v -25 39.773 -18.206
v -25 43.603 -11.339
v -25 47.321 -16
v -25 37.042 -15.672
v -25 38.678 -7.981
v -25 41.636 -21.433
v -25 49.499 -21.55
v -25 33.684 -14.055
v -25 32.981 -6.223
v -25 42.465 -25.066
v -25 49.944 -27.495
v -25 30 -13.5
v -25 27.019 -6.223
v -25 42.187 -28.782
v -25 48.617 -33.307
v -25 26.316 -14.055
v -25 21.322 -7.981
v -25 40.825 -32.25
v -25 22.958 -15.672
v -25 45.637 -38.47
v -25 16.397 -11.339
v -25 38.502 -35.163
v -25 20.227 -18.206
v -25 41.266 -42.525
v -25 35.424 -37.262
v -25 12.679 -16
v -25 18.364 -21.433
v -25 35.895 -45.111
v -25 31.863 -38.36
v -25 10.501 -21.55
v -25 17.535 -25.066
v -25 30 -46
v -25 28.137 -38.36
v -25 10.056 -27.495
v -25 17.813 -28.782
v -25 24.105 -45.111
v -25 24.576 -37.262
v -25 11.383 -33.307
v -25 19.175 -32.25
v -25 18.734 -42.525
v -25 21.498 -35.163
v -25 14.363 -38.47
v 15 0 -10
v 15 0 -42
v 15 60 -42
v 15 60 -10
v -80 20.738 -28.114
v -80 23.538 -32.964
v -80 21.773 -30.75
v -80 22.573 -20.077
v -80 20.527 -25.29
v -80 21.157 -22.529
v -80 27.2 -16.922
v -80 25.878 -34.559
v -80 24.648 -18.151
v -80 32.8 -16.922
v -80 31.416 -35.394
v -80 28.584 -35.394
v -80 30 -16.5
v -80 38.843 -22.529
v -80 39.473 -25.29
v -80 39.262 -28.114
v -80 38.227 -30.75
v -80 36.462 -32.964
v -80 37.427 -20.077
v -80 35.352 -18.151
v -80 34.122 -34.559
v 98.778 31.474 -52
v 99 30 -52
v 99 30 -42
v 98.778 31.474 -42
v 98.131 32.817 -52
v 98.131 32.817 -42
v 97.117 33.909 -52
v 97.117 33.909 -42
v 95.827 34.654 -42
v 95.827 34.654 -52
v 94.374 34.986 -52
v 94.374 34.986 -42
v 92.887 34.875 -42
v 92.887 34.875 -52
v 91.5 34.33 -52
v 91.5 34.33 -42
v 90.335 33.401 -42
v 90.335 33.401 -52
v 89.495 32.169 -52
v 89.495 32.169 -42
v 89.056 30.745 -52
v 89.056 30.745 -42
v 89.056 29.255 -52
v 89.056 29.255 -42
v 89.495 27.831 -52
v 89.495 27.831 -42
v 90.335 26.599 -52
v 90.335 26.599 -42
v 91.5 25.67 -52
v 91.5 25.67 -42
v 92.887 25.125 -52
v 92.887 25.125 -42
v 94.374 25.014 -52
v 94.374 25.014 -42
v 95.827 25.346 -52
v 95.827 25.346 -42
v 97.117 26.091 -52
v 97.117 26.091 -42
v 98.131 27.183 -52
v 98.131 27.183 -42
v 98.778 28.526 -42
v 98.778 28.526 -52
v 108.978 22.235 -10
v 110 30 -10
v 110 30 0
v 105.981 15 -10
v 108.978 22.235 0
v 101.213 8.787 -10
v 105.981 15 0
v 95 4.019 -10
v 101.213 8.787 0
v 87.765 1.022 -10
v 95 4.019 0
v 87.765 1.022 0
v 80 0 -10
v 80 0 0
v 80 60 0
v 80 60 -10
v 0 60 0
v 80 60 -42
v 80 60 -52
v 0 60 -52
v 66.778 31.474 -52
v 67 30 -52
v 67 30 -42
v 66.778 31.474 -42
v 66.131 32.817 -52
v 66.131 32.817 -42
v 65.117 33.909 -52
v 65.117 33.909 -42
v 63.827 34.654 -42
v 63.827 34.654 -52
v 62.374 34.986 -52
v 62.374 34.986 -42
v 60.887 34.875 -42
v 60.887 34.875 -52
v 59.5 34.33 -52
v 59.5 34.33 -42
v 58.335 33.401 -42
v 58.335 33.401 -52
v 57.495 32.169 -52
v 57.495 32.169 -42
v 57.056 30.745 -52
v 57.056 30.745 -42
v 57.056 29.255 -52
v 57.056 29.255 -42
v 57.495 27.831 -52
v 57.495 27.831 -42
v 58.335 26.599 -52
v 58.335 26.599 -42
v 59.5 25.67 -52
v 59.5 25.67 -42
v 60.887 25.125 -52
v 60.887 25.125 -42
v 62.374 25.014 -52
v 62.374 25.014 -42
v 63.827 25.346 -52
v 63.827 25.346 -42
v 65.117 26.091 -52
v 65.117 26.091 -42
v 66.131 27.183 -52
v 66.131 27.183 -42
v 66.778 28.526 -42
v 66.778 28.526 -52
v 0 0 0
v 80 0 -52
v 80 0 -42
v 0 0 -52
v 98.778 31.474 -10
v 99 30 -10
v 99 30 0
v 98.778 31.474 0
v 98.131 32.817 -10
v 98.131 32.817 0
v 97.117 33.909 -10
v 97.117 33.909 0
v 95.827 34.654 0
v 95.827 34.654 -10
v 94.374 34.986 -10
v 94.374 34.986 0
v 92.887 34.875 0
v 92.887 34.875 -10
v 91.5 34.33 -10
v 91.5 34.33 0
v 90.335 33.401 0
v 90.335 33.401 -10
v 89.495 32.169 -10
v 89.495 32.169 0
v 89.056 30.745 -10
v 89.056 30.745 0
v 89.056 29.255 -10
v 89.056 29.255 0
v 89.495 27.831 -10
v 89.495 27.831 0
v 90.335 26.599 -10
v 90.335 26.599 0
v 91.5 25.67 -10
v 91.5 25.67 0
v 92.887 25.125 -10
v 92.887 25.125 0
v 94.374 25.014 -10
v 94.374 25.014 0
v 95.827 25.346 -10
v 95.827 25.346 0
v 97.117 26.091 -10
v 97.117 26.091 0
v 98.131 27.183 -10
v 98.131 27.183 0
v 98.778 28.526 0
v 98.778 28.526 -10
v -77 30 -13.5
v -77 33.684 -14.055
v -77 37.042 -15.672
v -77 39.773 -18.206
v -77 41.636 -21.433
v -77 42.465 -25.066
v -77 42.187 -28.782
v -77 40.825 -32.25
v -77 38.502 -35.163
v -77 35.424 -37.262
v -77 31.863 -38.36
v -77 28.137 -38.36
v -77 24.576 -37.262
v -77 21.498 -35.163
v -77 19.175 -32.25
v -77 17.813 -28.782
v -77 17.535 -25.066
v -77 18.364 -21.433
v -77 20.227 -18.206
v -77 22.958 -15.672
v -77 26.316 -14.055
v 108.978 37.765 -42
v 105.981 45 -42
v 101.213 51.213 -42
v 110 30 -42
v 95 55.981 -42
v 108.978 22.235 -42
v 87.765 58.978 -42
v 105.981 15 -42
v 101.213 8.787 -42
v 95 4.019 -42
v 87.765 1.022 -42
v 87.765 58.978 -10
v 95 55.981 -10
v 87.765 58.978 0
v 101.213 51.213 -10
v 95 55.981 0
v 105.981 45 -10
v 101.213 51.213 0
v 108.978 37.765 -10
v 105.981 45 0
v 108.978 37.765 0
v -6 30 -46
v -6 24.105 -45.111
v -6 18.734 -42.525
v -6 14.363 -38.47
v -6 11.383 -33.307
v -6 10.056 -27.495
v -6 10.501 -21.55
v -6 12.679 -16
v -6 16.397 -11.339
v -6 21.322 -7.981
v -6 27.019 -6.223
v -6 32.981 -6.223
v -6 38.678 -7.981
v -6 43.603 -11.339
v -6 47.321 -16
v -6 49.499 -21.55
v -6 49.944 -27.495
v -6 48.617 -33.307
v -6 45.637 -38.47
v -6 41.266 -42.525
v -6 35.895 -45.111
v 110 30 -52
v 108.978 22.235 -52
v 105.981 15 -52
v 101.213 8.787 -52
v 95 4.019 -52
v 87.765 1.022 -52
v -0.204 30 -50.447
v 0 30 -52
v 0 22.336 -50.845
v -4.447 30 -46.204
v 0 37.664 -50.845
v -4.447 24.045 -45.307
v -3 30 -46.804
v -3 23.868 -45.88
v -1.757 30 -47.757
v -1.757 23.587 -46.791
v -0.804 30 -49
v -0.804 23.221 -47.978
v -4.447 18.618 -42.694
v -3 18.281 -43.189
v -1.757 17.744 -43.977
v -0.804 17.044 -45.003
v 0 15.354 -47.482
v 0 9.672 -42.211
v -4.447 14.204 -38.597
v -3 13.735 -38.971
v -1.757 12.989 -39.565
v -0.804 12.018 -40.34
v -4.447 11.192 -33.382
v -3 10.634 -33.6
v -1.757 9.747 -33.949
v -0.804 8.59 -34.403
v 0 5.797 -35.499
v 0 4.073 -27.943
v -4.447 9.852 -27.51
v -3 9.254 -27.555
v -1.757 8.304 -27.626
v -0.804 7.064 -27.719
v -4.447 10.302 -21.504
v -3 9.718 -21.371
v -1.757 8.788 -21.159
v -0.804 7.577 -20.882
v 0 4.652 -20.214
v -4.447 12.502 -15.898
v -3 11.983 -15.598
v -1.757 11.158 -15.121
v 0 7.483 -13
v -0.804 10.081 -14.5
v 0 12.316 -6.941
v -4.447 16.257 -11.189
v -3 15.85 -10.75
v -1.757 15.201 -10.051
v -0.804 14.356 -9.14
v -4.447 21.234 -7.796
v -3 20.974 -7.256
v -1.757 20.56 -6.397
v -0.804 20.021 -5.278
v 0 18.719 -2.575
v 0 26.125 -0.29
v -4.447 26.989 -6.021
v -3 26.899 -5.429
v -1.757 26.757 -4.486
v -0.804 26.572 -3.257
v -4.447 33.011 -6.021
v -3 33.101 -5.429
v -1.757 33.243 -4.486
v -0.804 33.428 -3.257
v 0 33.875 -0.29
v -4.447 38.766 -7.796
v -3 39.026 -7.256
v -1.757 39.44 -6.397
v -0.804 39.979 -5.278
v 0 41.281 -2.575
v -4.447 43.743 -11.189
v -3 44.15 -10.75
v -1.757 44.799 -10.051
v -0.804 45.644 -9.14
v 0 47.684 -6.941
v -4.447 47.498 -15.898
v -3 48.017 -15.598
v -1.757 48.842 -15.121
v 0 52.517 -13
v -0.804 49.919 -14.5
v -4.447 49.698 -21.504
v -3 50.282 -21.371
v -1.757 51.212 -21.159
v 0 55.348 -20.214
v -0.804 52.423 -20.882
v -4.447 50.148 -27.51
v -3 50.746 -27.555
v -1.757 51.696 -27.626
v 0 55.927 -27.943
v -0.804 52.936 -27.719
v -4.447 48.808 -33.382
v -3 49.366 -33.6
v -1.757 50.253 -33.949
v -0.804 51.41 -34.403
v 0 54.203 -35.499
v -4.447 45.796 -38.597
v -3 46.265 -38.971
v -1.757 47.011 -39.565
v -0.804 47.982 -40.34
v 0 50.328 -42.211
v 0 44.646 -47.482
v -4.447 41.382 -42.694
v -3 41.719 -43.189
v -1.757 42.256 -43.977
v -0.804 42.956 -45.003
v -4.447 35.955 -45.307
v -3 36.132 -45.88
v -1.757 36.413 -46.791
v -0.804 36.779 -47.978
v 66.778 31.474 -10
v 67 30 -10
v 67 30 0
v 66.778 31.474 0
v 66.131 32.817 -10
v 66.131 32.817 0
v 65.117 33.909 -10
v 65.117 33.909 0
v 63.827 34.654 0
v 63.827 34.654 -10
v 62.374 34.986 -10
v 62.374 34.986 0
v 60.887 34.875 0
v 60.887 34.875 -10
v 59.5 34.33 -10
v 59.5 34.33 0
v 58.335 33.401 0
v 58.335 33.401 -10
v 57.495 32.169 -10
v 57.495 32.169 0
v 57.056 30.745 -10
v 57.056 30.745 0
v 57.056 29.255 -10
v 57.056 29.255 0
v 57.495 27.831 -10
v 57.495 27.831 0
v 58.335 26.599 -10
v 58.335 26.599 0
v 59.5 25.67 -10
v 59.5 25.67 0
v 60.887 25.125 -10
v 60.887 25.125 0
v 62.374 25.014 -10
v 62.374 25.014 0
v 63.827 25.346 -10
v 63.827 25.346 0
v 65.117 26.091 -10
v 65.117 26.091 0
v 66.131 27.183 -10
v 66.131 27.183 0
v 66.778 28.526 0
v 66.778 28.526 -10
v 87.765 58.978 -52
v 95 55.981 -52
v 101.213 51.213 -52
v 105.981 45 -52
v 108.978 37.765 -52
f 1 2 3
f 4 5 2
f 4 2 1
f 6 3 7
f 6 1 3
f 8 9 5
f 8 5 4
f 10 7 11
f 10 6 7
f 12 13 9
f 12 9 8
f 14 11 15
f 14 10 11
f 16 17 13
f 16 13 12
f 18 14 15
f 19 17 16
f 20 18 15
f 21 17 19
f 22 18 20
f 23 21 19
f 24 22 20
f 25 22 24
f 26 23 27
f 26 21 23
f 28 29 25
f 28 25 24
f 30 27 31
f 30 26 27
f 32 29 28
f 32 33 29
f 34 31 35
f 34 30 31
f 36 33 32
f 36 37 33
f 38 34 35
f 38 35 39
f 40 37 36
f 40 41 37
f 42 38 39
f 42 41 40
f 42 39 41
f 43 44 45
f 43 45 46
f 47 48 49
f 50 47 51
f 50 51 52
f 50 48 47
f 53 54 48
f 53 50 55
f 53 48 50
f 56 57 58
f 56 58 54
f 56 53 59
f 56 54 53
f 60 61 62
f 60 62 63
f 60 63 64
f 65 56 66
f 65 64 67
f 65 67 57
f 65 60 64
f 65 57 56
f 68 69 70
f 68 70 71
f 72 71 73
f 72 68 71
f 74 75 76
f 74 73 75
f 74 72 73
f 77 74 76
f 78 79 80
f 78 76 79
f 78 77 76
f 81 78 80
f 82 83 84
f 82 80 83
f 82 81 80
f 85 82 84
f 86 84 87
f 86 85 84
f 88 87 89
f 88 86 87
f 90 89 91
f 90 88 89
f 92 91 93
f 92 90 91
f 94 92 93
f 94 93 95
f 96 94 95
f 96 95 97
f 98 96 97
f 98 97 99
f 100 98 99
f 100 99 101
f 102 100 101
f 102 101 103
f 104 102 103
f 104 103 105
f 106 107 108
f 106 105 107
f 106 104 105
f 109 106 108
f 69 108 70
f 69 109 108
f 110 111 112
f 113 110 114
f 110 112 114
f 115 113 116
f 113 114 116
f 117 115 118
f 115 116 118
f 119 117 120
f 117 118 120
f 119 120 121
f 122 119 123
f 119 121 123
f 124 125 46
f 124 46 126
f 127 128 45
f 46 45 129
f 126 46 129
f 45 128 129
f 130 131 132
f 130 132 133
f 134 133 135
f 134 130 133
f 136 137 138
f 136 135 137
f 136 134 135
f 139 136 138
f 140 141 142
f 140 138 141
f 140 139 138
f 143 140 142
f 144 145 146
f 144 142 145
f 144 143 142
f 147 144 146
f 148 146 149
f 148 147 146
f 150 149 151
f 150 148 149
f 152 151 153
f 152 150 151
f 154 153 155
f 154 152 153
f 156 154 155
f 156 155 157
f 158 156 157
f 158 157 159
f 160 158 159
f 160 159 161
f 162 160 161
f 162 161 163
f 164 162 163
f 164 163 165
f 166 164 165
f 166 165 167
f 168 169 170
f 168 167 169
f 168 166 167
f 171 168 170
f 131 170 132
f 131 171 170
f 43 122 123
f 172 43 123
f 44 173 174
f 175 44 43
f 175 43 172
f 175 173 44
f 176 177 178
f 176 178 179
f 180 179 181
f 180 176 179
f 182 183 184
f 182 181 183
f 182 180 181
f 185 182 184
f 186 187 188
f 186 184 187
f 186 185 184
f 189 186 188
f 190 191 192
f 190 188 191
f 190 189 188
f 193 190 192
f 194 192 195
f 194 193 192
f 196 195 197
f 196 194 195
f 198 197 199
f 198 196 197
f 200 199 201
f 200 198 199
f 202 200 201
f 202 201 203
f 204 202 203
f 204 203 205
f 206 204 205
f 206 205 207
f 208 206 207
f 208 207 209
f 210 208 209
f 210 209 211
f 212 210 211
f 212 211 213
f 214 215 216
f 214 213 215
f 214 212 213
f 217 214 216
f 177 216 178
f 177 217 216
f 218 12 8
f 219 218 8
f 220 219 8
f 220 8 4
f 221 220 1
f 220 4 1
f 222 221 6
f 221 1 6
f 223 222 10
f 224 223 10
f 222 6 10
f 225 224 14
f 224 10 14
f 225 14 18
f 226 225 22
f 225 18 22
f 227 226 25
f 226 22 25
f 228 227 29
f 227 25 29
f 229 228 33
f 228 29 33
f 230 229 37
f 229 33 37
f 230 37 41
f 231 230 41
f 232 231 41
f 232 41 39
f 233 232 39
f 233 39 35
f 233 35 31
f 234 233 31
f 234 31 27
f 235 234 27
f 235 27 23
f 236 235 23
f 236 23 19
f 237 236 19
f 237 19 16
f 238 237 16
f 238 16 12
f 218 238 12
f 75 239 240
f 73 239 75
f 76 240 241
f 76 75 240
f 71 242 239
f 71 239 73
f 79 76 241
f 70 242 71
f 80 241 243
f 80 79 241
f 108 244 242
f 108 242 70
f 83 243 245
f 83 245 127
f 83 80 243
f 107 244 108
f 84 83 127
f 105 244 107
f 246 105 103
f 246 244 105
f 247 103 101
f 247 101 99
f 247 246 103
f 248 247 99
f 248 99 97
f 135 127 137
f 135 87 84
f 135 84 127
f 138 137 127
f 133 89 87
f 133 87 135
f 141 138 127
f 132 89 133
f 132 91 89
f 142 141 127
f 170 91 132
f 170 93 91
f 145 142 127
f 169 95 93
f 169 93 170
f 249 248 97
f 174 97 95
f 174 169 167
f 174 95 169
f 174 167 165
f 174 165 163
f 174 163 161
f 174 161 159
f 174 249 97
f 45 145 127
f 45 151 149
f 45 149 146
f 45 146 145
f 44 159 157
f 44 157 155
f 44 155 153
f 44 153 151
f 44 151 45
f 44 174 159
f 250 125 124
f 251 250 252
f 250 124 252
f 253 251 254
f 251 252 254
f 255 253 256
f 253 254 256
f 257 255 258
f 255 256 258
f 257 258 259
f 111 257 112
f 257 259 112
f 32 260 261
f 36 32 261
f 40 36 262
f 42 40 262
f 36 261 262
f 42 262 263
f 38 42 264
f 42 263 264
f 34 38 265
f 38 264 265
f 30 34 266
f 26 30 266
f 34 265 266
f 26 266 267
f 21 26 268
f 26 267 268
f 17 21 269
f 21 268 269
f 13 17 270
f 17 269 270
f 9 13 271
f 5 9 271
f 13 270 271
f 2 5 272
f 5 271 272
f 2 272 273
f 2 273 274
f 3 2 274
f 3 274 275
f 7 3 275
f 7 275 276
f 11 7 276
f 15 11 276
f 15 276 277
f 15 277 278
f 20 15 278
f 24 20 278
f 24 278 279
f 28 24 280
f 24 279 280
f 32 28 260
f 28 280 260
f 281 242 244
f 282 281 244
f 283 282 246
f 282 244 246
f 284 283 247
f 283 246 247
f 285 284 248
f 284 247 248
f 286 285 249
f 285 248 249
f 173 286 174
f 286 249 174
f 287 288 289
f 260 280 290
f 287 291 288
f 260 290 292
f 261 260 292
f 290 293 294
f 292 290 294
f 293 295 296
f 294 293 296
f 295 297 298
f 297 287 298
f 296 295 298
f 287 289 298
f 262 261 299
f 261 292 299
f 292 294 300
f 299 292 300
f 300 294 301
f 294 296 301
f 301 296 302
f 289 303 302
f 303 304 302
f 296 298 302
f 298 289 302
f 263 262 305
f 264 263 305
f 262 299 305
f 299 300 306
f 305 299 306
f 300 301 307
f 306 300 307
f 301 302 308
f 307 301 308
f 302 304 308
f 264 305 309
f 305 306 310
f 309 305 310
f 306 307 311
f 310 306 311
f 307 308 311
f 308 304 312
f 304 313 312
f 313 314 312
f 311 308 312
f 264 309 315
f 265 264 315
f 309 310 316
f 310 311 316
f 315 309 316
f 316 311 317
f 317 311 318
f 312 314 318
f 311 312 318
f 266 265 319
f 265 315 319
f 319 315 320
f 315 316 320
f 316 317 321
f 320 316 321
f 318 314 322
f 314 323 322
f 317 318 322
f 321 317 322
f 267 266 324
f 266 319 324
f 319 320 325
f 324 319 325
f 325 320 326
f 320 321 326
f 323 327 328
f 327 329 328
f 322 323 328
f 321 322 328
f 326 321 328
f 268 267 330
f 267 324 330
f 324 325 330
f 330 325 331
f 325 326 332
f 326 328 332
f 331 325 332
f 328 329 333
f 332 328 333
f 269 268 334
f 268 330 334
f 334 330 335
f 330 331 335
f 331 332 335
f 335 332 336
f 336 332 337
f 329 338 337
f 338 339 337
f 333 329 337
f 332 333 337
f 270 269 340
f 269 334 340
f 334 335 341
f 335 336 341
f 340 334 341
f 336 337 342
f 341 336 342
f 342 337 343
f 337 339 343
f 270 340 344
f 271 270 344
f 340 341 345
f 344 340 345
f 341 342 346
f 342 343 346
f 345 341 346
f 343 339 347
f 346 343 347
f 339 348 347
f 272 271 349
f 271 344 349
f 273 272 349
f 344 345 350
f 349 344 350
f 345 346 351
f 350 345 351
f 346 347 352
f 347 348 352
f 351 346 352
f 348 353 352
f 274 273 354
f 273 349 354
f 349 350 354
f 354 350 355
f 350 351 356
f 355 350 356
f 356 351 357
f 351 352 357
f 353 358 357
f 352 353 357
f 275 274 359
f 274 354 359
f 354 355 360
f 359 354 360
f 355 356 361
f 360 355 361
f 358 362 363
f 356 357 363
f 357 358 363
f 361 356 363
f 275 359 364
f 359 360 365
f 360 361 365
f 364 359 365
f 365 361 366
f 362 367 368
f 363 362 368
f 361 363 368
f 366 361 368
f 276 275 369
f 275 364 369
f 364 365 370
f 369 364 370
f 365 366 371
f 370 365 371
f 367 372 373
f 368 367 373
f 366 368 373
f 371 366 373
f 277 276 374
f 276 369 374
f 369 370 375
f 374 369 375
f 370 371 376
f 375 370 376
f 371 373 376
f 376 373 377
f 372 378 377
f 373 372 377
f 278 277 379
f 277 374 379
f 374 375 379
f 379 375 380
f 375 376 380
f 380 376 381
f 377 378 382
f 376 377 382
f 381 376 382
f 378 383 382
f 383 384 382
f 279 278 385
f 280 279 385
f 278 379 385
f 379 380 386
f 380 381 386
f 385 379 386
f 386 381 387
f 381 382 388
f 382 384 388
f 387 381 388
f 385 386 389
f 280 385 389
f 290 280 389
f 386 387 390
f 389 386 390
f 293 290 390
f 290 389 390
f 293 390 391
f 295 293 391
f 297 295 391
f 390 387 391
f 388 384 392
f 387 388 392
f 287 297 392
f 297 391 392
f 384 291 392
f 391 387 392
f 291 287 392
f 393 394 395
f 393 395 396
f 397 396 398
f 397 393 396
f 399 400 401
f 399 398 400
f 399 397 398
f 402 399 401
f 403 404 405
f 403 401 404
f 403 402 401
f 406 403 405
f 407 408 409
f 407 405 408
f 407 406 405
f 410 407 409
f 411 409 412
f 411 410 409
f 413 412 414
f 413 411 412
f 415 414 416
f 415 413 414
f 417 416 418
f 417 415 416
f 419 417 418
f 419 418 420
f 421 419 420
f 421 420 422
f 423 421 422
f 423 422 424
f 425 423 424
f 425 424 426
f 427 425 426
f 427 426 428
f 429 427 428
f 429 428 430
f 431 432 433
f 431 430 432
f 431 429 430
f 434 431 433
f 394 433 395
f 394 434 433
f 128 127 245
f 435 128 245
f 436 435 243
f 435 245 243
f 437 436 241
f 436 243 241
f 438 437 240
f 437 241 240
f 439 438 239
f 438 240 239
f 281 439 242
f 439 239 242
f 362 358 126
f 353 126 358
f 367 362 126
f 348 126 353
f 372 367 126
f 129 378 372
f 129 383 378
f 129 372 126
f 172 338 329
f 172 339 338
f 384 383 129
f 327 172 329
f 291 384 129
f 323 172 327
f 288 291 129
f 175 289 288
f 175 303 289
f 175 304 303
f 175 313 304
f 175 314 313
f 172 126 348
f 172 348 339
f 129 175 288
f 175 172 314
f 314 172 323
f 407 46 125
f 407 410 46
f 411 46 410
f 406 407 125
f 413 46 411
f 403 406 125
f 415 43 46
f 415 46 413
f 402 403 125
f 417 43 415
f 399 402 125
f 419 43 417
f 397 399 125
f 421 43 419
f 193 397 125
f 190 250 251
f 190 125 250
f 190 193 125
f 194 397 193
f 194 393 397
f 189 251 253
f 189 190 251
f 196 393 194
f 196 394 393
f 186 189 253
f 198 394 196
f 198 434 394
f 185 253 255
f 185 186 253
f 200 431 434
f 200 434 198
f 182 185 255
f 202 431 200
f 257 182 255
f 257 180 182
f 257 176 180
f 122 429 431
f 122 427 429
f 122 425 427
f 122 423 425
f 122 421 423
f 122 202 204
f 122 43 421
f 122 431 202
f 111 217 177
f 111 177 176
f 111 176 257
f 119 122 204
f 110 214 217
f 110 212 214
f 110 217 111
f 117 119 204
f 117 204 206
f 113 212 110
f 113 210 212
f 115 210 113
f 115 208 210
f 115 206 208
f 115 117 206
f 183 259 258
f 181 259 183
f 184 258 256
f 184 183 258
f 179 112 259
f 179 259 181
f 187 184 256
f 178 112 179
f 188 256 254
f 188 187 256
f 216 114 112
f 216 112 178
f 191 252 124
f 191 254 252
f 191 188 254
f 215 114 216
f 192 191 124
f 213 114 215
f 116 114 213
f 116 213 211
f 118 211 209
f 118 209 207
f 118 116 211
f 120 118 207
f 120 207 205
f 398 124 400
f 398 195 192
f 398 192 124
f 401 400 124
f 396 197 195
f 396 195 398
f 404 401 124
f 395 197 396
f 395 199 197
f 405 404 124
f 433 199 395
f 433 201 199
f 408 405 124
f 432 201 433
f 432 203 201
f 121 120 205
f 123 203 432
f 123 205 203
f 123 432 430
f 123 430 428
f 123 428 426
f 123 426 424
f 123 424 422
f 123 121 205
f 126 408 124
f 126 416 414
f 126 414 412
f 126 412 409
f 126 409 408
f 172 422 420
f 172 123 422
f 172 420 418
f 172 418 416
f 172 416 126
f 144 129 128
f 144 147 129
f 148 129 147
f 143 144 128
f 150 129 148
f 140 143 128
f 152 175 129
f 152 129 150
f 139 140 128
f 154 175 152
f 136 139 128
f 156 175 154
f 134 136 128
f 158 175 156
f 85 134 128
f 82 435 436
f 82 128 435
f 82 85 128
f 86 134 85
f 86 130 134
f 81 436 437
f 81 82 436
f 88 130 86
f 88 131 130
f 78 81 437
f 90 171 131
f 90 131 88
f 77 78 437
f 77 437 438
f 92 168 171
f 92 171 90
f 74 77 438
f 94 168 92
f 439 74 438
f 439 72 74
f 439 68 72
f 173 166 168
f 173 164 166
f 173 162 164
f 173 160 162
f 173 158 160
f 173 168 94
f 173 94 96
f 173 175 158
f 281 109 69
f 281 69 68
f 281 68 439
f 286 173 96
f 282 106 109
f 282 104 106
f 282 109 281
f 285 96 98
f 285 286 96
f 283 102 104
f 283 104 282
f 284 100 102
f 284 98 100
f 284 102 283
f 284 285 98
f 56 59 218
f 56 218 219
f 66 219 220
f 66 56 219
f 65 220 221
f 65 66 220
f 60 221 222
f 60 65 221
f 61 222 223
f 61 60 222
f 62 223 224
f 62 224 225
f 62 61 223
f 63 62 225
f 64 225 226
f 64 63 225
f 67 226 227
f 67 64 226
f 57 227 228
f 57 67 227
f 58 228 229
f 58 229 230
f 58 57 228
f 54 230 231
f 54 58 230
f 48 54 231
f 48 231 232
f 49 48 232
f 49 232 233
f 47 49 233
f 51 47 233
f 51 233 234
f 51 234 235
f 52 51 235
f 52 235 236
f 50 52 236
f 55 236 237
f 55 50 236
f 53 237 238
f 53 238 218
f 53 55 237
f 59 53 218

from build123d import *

# Parameters (mm, degrees)
BOSS_EXTRUDE2_DEPTH     = 60
CUT_EXTRUDE1_DEPTH      = 136.661343057
SKETCH3_R               = 12.5
BOSS_EXTRUDE3_DEPTH     = 80
SKETCH3_3_R             = 20
SKETCH3_3_R_2           = 12.5
BOSS_EXTRUDE4_DEPTH     = 25
FILLET2_R               = 6
CHAMFER1_SIZE           = 3
CUT_EXTRUDE2_DEPTH      = 136.661343057
CUT_EXTRUDE2_DEPTH_BACK = 136.661343057
SKETCH4_R               = 5


with BuildPart() as part:
    # Sketch1 → Boss-Extrude2 (new body)
    with BuildSketch(Plane(origin=(0, 0, 0), x_dir=(1, 0, 0), z_dir=(0, 1, 0))):
        Polygon((110, 10), (110, 0), (0, 0), (0, 52), (110, 52), (110, 42), (15, 42), (15, 10), align=None)
    extrude(amount=BOSS_EXTRUDE2_DEPTH)

    # Sketch2 → Cut-Extrude1 (cut, through all)
    with BuildSketch(Plane.XY):
        with BuildLine():
            Line((110, 60), (80, 60))
            ThreePointArc((80, 60), (101.213203436, 51.213203436), (110, 30))
            Line((110, 30), (110, 60))
        make_face()
        with BuildLine():
            Line((110, 0), (110, 30))
            ThreePointArc((110, 30), (101.213203436, 8.786796564), (80, 0))
            Line((80, 0), (110, 0))
        make_face()
    extrude(amount=-CUT_EXTRUDE1_DEPTH, mode=Mode.SUBTRACT)

    # Sketch3 → Boss-Extrude3 (add)
    with BuildSketch(Plane.ZY):
        with Locations((-26, 30)):
            Circle(SKETCH3_R)
    extrude(amount=BOSS_EXTRUDE3_DEPTH)

    # Sketch3<3> → Boss-Extrude4 (add)
    with BuildSketch(Plane.ZY):
        with Locations(Location((-26, 30, 0), (0, 0, 180))):
            Circle(SKETCH3_3_R)
        with Locations((-26, 30)):
            Circle(SKETCH3_3_R_2, mode=Mode.SUBTRACT)
    extrude(amount=BOSS_EXTRUDE4_DEPTH)

    # Fillet2
    fillet2_edges = [part.edges().sort_by_distance(p)[0] for p in [
        (0, 30, -6),
    ]]
    fillet(fillet2_edges, radius=FILLET2_R - 0.0001)  # a hair under: the kernel refuses the full size

    # Chamfer1
    chamfer1_edges = [part.edges().sort_by_distance(p)[0] for p in [
        (-80, 30, -38.5),
    ]]
    chamfer(chamfer1_edges, length=CHAMFER1_SIZE)

    # Sketch4 → Cut-Extrude2 (cut, two sides: drawn at the far end of the back side and taken through both)
    with BuildSketch(Plane.XY.offset(-CUT_EXTRUDE2_DEPTH_BACK)):
        with Locations((62, 30)):
            Circle(SKETCH4_R)
        with Locations((94, 30)):
            Circle(SKETCH4_R)
    extrude(amount=CUT_EXTRUDE2_DEPTH + CUT_EXTRUDE2_DEPTH_BACK, mode=Mode.SUBTRACT)


solid = part.part
